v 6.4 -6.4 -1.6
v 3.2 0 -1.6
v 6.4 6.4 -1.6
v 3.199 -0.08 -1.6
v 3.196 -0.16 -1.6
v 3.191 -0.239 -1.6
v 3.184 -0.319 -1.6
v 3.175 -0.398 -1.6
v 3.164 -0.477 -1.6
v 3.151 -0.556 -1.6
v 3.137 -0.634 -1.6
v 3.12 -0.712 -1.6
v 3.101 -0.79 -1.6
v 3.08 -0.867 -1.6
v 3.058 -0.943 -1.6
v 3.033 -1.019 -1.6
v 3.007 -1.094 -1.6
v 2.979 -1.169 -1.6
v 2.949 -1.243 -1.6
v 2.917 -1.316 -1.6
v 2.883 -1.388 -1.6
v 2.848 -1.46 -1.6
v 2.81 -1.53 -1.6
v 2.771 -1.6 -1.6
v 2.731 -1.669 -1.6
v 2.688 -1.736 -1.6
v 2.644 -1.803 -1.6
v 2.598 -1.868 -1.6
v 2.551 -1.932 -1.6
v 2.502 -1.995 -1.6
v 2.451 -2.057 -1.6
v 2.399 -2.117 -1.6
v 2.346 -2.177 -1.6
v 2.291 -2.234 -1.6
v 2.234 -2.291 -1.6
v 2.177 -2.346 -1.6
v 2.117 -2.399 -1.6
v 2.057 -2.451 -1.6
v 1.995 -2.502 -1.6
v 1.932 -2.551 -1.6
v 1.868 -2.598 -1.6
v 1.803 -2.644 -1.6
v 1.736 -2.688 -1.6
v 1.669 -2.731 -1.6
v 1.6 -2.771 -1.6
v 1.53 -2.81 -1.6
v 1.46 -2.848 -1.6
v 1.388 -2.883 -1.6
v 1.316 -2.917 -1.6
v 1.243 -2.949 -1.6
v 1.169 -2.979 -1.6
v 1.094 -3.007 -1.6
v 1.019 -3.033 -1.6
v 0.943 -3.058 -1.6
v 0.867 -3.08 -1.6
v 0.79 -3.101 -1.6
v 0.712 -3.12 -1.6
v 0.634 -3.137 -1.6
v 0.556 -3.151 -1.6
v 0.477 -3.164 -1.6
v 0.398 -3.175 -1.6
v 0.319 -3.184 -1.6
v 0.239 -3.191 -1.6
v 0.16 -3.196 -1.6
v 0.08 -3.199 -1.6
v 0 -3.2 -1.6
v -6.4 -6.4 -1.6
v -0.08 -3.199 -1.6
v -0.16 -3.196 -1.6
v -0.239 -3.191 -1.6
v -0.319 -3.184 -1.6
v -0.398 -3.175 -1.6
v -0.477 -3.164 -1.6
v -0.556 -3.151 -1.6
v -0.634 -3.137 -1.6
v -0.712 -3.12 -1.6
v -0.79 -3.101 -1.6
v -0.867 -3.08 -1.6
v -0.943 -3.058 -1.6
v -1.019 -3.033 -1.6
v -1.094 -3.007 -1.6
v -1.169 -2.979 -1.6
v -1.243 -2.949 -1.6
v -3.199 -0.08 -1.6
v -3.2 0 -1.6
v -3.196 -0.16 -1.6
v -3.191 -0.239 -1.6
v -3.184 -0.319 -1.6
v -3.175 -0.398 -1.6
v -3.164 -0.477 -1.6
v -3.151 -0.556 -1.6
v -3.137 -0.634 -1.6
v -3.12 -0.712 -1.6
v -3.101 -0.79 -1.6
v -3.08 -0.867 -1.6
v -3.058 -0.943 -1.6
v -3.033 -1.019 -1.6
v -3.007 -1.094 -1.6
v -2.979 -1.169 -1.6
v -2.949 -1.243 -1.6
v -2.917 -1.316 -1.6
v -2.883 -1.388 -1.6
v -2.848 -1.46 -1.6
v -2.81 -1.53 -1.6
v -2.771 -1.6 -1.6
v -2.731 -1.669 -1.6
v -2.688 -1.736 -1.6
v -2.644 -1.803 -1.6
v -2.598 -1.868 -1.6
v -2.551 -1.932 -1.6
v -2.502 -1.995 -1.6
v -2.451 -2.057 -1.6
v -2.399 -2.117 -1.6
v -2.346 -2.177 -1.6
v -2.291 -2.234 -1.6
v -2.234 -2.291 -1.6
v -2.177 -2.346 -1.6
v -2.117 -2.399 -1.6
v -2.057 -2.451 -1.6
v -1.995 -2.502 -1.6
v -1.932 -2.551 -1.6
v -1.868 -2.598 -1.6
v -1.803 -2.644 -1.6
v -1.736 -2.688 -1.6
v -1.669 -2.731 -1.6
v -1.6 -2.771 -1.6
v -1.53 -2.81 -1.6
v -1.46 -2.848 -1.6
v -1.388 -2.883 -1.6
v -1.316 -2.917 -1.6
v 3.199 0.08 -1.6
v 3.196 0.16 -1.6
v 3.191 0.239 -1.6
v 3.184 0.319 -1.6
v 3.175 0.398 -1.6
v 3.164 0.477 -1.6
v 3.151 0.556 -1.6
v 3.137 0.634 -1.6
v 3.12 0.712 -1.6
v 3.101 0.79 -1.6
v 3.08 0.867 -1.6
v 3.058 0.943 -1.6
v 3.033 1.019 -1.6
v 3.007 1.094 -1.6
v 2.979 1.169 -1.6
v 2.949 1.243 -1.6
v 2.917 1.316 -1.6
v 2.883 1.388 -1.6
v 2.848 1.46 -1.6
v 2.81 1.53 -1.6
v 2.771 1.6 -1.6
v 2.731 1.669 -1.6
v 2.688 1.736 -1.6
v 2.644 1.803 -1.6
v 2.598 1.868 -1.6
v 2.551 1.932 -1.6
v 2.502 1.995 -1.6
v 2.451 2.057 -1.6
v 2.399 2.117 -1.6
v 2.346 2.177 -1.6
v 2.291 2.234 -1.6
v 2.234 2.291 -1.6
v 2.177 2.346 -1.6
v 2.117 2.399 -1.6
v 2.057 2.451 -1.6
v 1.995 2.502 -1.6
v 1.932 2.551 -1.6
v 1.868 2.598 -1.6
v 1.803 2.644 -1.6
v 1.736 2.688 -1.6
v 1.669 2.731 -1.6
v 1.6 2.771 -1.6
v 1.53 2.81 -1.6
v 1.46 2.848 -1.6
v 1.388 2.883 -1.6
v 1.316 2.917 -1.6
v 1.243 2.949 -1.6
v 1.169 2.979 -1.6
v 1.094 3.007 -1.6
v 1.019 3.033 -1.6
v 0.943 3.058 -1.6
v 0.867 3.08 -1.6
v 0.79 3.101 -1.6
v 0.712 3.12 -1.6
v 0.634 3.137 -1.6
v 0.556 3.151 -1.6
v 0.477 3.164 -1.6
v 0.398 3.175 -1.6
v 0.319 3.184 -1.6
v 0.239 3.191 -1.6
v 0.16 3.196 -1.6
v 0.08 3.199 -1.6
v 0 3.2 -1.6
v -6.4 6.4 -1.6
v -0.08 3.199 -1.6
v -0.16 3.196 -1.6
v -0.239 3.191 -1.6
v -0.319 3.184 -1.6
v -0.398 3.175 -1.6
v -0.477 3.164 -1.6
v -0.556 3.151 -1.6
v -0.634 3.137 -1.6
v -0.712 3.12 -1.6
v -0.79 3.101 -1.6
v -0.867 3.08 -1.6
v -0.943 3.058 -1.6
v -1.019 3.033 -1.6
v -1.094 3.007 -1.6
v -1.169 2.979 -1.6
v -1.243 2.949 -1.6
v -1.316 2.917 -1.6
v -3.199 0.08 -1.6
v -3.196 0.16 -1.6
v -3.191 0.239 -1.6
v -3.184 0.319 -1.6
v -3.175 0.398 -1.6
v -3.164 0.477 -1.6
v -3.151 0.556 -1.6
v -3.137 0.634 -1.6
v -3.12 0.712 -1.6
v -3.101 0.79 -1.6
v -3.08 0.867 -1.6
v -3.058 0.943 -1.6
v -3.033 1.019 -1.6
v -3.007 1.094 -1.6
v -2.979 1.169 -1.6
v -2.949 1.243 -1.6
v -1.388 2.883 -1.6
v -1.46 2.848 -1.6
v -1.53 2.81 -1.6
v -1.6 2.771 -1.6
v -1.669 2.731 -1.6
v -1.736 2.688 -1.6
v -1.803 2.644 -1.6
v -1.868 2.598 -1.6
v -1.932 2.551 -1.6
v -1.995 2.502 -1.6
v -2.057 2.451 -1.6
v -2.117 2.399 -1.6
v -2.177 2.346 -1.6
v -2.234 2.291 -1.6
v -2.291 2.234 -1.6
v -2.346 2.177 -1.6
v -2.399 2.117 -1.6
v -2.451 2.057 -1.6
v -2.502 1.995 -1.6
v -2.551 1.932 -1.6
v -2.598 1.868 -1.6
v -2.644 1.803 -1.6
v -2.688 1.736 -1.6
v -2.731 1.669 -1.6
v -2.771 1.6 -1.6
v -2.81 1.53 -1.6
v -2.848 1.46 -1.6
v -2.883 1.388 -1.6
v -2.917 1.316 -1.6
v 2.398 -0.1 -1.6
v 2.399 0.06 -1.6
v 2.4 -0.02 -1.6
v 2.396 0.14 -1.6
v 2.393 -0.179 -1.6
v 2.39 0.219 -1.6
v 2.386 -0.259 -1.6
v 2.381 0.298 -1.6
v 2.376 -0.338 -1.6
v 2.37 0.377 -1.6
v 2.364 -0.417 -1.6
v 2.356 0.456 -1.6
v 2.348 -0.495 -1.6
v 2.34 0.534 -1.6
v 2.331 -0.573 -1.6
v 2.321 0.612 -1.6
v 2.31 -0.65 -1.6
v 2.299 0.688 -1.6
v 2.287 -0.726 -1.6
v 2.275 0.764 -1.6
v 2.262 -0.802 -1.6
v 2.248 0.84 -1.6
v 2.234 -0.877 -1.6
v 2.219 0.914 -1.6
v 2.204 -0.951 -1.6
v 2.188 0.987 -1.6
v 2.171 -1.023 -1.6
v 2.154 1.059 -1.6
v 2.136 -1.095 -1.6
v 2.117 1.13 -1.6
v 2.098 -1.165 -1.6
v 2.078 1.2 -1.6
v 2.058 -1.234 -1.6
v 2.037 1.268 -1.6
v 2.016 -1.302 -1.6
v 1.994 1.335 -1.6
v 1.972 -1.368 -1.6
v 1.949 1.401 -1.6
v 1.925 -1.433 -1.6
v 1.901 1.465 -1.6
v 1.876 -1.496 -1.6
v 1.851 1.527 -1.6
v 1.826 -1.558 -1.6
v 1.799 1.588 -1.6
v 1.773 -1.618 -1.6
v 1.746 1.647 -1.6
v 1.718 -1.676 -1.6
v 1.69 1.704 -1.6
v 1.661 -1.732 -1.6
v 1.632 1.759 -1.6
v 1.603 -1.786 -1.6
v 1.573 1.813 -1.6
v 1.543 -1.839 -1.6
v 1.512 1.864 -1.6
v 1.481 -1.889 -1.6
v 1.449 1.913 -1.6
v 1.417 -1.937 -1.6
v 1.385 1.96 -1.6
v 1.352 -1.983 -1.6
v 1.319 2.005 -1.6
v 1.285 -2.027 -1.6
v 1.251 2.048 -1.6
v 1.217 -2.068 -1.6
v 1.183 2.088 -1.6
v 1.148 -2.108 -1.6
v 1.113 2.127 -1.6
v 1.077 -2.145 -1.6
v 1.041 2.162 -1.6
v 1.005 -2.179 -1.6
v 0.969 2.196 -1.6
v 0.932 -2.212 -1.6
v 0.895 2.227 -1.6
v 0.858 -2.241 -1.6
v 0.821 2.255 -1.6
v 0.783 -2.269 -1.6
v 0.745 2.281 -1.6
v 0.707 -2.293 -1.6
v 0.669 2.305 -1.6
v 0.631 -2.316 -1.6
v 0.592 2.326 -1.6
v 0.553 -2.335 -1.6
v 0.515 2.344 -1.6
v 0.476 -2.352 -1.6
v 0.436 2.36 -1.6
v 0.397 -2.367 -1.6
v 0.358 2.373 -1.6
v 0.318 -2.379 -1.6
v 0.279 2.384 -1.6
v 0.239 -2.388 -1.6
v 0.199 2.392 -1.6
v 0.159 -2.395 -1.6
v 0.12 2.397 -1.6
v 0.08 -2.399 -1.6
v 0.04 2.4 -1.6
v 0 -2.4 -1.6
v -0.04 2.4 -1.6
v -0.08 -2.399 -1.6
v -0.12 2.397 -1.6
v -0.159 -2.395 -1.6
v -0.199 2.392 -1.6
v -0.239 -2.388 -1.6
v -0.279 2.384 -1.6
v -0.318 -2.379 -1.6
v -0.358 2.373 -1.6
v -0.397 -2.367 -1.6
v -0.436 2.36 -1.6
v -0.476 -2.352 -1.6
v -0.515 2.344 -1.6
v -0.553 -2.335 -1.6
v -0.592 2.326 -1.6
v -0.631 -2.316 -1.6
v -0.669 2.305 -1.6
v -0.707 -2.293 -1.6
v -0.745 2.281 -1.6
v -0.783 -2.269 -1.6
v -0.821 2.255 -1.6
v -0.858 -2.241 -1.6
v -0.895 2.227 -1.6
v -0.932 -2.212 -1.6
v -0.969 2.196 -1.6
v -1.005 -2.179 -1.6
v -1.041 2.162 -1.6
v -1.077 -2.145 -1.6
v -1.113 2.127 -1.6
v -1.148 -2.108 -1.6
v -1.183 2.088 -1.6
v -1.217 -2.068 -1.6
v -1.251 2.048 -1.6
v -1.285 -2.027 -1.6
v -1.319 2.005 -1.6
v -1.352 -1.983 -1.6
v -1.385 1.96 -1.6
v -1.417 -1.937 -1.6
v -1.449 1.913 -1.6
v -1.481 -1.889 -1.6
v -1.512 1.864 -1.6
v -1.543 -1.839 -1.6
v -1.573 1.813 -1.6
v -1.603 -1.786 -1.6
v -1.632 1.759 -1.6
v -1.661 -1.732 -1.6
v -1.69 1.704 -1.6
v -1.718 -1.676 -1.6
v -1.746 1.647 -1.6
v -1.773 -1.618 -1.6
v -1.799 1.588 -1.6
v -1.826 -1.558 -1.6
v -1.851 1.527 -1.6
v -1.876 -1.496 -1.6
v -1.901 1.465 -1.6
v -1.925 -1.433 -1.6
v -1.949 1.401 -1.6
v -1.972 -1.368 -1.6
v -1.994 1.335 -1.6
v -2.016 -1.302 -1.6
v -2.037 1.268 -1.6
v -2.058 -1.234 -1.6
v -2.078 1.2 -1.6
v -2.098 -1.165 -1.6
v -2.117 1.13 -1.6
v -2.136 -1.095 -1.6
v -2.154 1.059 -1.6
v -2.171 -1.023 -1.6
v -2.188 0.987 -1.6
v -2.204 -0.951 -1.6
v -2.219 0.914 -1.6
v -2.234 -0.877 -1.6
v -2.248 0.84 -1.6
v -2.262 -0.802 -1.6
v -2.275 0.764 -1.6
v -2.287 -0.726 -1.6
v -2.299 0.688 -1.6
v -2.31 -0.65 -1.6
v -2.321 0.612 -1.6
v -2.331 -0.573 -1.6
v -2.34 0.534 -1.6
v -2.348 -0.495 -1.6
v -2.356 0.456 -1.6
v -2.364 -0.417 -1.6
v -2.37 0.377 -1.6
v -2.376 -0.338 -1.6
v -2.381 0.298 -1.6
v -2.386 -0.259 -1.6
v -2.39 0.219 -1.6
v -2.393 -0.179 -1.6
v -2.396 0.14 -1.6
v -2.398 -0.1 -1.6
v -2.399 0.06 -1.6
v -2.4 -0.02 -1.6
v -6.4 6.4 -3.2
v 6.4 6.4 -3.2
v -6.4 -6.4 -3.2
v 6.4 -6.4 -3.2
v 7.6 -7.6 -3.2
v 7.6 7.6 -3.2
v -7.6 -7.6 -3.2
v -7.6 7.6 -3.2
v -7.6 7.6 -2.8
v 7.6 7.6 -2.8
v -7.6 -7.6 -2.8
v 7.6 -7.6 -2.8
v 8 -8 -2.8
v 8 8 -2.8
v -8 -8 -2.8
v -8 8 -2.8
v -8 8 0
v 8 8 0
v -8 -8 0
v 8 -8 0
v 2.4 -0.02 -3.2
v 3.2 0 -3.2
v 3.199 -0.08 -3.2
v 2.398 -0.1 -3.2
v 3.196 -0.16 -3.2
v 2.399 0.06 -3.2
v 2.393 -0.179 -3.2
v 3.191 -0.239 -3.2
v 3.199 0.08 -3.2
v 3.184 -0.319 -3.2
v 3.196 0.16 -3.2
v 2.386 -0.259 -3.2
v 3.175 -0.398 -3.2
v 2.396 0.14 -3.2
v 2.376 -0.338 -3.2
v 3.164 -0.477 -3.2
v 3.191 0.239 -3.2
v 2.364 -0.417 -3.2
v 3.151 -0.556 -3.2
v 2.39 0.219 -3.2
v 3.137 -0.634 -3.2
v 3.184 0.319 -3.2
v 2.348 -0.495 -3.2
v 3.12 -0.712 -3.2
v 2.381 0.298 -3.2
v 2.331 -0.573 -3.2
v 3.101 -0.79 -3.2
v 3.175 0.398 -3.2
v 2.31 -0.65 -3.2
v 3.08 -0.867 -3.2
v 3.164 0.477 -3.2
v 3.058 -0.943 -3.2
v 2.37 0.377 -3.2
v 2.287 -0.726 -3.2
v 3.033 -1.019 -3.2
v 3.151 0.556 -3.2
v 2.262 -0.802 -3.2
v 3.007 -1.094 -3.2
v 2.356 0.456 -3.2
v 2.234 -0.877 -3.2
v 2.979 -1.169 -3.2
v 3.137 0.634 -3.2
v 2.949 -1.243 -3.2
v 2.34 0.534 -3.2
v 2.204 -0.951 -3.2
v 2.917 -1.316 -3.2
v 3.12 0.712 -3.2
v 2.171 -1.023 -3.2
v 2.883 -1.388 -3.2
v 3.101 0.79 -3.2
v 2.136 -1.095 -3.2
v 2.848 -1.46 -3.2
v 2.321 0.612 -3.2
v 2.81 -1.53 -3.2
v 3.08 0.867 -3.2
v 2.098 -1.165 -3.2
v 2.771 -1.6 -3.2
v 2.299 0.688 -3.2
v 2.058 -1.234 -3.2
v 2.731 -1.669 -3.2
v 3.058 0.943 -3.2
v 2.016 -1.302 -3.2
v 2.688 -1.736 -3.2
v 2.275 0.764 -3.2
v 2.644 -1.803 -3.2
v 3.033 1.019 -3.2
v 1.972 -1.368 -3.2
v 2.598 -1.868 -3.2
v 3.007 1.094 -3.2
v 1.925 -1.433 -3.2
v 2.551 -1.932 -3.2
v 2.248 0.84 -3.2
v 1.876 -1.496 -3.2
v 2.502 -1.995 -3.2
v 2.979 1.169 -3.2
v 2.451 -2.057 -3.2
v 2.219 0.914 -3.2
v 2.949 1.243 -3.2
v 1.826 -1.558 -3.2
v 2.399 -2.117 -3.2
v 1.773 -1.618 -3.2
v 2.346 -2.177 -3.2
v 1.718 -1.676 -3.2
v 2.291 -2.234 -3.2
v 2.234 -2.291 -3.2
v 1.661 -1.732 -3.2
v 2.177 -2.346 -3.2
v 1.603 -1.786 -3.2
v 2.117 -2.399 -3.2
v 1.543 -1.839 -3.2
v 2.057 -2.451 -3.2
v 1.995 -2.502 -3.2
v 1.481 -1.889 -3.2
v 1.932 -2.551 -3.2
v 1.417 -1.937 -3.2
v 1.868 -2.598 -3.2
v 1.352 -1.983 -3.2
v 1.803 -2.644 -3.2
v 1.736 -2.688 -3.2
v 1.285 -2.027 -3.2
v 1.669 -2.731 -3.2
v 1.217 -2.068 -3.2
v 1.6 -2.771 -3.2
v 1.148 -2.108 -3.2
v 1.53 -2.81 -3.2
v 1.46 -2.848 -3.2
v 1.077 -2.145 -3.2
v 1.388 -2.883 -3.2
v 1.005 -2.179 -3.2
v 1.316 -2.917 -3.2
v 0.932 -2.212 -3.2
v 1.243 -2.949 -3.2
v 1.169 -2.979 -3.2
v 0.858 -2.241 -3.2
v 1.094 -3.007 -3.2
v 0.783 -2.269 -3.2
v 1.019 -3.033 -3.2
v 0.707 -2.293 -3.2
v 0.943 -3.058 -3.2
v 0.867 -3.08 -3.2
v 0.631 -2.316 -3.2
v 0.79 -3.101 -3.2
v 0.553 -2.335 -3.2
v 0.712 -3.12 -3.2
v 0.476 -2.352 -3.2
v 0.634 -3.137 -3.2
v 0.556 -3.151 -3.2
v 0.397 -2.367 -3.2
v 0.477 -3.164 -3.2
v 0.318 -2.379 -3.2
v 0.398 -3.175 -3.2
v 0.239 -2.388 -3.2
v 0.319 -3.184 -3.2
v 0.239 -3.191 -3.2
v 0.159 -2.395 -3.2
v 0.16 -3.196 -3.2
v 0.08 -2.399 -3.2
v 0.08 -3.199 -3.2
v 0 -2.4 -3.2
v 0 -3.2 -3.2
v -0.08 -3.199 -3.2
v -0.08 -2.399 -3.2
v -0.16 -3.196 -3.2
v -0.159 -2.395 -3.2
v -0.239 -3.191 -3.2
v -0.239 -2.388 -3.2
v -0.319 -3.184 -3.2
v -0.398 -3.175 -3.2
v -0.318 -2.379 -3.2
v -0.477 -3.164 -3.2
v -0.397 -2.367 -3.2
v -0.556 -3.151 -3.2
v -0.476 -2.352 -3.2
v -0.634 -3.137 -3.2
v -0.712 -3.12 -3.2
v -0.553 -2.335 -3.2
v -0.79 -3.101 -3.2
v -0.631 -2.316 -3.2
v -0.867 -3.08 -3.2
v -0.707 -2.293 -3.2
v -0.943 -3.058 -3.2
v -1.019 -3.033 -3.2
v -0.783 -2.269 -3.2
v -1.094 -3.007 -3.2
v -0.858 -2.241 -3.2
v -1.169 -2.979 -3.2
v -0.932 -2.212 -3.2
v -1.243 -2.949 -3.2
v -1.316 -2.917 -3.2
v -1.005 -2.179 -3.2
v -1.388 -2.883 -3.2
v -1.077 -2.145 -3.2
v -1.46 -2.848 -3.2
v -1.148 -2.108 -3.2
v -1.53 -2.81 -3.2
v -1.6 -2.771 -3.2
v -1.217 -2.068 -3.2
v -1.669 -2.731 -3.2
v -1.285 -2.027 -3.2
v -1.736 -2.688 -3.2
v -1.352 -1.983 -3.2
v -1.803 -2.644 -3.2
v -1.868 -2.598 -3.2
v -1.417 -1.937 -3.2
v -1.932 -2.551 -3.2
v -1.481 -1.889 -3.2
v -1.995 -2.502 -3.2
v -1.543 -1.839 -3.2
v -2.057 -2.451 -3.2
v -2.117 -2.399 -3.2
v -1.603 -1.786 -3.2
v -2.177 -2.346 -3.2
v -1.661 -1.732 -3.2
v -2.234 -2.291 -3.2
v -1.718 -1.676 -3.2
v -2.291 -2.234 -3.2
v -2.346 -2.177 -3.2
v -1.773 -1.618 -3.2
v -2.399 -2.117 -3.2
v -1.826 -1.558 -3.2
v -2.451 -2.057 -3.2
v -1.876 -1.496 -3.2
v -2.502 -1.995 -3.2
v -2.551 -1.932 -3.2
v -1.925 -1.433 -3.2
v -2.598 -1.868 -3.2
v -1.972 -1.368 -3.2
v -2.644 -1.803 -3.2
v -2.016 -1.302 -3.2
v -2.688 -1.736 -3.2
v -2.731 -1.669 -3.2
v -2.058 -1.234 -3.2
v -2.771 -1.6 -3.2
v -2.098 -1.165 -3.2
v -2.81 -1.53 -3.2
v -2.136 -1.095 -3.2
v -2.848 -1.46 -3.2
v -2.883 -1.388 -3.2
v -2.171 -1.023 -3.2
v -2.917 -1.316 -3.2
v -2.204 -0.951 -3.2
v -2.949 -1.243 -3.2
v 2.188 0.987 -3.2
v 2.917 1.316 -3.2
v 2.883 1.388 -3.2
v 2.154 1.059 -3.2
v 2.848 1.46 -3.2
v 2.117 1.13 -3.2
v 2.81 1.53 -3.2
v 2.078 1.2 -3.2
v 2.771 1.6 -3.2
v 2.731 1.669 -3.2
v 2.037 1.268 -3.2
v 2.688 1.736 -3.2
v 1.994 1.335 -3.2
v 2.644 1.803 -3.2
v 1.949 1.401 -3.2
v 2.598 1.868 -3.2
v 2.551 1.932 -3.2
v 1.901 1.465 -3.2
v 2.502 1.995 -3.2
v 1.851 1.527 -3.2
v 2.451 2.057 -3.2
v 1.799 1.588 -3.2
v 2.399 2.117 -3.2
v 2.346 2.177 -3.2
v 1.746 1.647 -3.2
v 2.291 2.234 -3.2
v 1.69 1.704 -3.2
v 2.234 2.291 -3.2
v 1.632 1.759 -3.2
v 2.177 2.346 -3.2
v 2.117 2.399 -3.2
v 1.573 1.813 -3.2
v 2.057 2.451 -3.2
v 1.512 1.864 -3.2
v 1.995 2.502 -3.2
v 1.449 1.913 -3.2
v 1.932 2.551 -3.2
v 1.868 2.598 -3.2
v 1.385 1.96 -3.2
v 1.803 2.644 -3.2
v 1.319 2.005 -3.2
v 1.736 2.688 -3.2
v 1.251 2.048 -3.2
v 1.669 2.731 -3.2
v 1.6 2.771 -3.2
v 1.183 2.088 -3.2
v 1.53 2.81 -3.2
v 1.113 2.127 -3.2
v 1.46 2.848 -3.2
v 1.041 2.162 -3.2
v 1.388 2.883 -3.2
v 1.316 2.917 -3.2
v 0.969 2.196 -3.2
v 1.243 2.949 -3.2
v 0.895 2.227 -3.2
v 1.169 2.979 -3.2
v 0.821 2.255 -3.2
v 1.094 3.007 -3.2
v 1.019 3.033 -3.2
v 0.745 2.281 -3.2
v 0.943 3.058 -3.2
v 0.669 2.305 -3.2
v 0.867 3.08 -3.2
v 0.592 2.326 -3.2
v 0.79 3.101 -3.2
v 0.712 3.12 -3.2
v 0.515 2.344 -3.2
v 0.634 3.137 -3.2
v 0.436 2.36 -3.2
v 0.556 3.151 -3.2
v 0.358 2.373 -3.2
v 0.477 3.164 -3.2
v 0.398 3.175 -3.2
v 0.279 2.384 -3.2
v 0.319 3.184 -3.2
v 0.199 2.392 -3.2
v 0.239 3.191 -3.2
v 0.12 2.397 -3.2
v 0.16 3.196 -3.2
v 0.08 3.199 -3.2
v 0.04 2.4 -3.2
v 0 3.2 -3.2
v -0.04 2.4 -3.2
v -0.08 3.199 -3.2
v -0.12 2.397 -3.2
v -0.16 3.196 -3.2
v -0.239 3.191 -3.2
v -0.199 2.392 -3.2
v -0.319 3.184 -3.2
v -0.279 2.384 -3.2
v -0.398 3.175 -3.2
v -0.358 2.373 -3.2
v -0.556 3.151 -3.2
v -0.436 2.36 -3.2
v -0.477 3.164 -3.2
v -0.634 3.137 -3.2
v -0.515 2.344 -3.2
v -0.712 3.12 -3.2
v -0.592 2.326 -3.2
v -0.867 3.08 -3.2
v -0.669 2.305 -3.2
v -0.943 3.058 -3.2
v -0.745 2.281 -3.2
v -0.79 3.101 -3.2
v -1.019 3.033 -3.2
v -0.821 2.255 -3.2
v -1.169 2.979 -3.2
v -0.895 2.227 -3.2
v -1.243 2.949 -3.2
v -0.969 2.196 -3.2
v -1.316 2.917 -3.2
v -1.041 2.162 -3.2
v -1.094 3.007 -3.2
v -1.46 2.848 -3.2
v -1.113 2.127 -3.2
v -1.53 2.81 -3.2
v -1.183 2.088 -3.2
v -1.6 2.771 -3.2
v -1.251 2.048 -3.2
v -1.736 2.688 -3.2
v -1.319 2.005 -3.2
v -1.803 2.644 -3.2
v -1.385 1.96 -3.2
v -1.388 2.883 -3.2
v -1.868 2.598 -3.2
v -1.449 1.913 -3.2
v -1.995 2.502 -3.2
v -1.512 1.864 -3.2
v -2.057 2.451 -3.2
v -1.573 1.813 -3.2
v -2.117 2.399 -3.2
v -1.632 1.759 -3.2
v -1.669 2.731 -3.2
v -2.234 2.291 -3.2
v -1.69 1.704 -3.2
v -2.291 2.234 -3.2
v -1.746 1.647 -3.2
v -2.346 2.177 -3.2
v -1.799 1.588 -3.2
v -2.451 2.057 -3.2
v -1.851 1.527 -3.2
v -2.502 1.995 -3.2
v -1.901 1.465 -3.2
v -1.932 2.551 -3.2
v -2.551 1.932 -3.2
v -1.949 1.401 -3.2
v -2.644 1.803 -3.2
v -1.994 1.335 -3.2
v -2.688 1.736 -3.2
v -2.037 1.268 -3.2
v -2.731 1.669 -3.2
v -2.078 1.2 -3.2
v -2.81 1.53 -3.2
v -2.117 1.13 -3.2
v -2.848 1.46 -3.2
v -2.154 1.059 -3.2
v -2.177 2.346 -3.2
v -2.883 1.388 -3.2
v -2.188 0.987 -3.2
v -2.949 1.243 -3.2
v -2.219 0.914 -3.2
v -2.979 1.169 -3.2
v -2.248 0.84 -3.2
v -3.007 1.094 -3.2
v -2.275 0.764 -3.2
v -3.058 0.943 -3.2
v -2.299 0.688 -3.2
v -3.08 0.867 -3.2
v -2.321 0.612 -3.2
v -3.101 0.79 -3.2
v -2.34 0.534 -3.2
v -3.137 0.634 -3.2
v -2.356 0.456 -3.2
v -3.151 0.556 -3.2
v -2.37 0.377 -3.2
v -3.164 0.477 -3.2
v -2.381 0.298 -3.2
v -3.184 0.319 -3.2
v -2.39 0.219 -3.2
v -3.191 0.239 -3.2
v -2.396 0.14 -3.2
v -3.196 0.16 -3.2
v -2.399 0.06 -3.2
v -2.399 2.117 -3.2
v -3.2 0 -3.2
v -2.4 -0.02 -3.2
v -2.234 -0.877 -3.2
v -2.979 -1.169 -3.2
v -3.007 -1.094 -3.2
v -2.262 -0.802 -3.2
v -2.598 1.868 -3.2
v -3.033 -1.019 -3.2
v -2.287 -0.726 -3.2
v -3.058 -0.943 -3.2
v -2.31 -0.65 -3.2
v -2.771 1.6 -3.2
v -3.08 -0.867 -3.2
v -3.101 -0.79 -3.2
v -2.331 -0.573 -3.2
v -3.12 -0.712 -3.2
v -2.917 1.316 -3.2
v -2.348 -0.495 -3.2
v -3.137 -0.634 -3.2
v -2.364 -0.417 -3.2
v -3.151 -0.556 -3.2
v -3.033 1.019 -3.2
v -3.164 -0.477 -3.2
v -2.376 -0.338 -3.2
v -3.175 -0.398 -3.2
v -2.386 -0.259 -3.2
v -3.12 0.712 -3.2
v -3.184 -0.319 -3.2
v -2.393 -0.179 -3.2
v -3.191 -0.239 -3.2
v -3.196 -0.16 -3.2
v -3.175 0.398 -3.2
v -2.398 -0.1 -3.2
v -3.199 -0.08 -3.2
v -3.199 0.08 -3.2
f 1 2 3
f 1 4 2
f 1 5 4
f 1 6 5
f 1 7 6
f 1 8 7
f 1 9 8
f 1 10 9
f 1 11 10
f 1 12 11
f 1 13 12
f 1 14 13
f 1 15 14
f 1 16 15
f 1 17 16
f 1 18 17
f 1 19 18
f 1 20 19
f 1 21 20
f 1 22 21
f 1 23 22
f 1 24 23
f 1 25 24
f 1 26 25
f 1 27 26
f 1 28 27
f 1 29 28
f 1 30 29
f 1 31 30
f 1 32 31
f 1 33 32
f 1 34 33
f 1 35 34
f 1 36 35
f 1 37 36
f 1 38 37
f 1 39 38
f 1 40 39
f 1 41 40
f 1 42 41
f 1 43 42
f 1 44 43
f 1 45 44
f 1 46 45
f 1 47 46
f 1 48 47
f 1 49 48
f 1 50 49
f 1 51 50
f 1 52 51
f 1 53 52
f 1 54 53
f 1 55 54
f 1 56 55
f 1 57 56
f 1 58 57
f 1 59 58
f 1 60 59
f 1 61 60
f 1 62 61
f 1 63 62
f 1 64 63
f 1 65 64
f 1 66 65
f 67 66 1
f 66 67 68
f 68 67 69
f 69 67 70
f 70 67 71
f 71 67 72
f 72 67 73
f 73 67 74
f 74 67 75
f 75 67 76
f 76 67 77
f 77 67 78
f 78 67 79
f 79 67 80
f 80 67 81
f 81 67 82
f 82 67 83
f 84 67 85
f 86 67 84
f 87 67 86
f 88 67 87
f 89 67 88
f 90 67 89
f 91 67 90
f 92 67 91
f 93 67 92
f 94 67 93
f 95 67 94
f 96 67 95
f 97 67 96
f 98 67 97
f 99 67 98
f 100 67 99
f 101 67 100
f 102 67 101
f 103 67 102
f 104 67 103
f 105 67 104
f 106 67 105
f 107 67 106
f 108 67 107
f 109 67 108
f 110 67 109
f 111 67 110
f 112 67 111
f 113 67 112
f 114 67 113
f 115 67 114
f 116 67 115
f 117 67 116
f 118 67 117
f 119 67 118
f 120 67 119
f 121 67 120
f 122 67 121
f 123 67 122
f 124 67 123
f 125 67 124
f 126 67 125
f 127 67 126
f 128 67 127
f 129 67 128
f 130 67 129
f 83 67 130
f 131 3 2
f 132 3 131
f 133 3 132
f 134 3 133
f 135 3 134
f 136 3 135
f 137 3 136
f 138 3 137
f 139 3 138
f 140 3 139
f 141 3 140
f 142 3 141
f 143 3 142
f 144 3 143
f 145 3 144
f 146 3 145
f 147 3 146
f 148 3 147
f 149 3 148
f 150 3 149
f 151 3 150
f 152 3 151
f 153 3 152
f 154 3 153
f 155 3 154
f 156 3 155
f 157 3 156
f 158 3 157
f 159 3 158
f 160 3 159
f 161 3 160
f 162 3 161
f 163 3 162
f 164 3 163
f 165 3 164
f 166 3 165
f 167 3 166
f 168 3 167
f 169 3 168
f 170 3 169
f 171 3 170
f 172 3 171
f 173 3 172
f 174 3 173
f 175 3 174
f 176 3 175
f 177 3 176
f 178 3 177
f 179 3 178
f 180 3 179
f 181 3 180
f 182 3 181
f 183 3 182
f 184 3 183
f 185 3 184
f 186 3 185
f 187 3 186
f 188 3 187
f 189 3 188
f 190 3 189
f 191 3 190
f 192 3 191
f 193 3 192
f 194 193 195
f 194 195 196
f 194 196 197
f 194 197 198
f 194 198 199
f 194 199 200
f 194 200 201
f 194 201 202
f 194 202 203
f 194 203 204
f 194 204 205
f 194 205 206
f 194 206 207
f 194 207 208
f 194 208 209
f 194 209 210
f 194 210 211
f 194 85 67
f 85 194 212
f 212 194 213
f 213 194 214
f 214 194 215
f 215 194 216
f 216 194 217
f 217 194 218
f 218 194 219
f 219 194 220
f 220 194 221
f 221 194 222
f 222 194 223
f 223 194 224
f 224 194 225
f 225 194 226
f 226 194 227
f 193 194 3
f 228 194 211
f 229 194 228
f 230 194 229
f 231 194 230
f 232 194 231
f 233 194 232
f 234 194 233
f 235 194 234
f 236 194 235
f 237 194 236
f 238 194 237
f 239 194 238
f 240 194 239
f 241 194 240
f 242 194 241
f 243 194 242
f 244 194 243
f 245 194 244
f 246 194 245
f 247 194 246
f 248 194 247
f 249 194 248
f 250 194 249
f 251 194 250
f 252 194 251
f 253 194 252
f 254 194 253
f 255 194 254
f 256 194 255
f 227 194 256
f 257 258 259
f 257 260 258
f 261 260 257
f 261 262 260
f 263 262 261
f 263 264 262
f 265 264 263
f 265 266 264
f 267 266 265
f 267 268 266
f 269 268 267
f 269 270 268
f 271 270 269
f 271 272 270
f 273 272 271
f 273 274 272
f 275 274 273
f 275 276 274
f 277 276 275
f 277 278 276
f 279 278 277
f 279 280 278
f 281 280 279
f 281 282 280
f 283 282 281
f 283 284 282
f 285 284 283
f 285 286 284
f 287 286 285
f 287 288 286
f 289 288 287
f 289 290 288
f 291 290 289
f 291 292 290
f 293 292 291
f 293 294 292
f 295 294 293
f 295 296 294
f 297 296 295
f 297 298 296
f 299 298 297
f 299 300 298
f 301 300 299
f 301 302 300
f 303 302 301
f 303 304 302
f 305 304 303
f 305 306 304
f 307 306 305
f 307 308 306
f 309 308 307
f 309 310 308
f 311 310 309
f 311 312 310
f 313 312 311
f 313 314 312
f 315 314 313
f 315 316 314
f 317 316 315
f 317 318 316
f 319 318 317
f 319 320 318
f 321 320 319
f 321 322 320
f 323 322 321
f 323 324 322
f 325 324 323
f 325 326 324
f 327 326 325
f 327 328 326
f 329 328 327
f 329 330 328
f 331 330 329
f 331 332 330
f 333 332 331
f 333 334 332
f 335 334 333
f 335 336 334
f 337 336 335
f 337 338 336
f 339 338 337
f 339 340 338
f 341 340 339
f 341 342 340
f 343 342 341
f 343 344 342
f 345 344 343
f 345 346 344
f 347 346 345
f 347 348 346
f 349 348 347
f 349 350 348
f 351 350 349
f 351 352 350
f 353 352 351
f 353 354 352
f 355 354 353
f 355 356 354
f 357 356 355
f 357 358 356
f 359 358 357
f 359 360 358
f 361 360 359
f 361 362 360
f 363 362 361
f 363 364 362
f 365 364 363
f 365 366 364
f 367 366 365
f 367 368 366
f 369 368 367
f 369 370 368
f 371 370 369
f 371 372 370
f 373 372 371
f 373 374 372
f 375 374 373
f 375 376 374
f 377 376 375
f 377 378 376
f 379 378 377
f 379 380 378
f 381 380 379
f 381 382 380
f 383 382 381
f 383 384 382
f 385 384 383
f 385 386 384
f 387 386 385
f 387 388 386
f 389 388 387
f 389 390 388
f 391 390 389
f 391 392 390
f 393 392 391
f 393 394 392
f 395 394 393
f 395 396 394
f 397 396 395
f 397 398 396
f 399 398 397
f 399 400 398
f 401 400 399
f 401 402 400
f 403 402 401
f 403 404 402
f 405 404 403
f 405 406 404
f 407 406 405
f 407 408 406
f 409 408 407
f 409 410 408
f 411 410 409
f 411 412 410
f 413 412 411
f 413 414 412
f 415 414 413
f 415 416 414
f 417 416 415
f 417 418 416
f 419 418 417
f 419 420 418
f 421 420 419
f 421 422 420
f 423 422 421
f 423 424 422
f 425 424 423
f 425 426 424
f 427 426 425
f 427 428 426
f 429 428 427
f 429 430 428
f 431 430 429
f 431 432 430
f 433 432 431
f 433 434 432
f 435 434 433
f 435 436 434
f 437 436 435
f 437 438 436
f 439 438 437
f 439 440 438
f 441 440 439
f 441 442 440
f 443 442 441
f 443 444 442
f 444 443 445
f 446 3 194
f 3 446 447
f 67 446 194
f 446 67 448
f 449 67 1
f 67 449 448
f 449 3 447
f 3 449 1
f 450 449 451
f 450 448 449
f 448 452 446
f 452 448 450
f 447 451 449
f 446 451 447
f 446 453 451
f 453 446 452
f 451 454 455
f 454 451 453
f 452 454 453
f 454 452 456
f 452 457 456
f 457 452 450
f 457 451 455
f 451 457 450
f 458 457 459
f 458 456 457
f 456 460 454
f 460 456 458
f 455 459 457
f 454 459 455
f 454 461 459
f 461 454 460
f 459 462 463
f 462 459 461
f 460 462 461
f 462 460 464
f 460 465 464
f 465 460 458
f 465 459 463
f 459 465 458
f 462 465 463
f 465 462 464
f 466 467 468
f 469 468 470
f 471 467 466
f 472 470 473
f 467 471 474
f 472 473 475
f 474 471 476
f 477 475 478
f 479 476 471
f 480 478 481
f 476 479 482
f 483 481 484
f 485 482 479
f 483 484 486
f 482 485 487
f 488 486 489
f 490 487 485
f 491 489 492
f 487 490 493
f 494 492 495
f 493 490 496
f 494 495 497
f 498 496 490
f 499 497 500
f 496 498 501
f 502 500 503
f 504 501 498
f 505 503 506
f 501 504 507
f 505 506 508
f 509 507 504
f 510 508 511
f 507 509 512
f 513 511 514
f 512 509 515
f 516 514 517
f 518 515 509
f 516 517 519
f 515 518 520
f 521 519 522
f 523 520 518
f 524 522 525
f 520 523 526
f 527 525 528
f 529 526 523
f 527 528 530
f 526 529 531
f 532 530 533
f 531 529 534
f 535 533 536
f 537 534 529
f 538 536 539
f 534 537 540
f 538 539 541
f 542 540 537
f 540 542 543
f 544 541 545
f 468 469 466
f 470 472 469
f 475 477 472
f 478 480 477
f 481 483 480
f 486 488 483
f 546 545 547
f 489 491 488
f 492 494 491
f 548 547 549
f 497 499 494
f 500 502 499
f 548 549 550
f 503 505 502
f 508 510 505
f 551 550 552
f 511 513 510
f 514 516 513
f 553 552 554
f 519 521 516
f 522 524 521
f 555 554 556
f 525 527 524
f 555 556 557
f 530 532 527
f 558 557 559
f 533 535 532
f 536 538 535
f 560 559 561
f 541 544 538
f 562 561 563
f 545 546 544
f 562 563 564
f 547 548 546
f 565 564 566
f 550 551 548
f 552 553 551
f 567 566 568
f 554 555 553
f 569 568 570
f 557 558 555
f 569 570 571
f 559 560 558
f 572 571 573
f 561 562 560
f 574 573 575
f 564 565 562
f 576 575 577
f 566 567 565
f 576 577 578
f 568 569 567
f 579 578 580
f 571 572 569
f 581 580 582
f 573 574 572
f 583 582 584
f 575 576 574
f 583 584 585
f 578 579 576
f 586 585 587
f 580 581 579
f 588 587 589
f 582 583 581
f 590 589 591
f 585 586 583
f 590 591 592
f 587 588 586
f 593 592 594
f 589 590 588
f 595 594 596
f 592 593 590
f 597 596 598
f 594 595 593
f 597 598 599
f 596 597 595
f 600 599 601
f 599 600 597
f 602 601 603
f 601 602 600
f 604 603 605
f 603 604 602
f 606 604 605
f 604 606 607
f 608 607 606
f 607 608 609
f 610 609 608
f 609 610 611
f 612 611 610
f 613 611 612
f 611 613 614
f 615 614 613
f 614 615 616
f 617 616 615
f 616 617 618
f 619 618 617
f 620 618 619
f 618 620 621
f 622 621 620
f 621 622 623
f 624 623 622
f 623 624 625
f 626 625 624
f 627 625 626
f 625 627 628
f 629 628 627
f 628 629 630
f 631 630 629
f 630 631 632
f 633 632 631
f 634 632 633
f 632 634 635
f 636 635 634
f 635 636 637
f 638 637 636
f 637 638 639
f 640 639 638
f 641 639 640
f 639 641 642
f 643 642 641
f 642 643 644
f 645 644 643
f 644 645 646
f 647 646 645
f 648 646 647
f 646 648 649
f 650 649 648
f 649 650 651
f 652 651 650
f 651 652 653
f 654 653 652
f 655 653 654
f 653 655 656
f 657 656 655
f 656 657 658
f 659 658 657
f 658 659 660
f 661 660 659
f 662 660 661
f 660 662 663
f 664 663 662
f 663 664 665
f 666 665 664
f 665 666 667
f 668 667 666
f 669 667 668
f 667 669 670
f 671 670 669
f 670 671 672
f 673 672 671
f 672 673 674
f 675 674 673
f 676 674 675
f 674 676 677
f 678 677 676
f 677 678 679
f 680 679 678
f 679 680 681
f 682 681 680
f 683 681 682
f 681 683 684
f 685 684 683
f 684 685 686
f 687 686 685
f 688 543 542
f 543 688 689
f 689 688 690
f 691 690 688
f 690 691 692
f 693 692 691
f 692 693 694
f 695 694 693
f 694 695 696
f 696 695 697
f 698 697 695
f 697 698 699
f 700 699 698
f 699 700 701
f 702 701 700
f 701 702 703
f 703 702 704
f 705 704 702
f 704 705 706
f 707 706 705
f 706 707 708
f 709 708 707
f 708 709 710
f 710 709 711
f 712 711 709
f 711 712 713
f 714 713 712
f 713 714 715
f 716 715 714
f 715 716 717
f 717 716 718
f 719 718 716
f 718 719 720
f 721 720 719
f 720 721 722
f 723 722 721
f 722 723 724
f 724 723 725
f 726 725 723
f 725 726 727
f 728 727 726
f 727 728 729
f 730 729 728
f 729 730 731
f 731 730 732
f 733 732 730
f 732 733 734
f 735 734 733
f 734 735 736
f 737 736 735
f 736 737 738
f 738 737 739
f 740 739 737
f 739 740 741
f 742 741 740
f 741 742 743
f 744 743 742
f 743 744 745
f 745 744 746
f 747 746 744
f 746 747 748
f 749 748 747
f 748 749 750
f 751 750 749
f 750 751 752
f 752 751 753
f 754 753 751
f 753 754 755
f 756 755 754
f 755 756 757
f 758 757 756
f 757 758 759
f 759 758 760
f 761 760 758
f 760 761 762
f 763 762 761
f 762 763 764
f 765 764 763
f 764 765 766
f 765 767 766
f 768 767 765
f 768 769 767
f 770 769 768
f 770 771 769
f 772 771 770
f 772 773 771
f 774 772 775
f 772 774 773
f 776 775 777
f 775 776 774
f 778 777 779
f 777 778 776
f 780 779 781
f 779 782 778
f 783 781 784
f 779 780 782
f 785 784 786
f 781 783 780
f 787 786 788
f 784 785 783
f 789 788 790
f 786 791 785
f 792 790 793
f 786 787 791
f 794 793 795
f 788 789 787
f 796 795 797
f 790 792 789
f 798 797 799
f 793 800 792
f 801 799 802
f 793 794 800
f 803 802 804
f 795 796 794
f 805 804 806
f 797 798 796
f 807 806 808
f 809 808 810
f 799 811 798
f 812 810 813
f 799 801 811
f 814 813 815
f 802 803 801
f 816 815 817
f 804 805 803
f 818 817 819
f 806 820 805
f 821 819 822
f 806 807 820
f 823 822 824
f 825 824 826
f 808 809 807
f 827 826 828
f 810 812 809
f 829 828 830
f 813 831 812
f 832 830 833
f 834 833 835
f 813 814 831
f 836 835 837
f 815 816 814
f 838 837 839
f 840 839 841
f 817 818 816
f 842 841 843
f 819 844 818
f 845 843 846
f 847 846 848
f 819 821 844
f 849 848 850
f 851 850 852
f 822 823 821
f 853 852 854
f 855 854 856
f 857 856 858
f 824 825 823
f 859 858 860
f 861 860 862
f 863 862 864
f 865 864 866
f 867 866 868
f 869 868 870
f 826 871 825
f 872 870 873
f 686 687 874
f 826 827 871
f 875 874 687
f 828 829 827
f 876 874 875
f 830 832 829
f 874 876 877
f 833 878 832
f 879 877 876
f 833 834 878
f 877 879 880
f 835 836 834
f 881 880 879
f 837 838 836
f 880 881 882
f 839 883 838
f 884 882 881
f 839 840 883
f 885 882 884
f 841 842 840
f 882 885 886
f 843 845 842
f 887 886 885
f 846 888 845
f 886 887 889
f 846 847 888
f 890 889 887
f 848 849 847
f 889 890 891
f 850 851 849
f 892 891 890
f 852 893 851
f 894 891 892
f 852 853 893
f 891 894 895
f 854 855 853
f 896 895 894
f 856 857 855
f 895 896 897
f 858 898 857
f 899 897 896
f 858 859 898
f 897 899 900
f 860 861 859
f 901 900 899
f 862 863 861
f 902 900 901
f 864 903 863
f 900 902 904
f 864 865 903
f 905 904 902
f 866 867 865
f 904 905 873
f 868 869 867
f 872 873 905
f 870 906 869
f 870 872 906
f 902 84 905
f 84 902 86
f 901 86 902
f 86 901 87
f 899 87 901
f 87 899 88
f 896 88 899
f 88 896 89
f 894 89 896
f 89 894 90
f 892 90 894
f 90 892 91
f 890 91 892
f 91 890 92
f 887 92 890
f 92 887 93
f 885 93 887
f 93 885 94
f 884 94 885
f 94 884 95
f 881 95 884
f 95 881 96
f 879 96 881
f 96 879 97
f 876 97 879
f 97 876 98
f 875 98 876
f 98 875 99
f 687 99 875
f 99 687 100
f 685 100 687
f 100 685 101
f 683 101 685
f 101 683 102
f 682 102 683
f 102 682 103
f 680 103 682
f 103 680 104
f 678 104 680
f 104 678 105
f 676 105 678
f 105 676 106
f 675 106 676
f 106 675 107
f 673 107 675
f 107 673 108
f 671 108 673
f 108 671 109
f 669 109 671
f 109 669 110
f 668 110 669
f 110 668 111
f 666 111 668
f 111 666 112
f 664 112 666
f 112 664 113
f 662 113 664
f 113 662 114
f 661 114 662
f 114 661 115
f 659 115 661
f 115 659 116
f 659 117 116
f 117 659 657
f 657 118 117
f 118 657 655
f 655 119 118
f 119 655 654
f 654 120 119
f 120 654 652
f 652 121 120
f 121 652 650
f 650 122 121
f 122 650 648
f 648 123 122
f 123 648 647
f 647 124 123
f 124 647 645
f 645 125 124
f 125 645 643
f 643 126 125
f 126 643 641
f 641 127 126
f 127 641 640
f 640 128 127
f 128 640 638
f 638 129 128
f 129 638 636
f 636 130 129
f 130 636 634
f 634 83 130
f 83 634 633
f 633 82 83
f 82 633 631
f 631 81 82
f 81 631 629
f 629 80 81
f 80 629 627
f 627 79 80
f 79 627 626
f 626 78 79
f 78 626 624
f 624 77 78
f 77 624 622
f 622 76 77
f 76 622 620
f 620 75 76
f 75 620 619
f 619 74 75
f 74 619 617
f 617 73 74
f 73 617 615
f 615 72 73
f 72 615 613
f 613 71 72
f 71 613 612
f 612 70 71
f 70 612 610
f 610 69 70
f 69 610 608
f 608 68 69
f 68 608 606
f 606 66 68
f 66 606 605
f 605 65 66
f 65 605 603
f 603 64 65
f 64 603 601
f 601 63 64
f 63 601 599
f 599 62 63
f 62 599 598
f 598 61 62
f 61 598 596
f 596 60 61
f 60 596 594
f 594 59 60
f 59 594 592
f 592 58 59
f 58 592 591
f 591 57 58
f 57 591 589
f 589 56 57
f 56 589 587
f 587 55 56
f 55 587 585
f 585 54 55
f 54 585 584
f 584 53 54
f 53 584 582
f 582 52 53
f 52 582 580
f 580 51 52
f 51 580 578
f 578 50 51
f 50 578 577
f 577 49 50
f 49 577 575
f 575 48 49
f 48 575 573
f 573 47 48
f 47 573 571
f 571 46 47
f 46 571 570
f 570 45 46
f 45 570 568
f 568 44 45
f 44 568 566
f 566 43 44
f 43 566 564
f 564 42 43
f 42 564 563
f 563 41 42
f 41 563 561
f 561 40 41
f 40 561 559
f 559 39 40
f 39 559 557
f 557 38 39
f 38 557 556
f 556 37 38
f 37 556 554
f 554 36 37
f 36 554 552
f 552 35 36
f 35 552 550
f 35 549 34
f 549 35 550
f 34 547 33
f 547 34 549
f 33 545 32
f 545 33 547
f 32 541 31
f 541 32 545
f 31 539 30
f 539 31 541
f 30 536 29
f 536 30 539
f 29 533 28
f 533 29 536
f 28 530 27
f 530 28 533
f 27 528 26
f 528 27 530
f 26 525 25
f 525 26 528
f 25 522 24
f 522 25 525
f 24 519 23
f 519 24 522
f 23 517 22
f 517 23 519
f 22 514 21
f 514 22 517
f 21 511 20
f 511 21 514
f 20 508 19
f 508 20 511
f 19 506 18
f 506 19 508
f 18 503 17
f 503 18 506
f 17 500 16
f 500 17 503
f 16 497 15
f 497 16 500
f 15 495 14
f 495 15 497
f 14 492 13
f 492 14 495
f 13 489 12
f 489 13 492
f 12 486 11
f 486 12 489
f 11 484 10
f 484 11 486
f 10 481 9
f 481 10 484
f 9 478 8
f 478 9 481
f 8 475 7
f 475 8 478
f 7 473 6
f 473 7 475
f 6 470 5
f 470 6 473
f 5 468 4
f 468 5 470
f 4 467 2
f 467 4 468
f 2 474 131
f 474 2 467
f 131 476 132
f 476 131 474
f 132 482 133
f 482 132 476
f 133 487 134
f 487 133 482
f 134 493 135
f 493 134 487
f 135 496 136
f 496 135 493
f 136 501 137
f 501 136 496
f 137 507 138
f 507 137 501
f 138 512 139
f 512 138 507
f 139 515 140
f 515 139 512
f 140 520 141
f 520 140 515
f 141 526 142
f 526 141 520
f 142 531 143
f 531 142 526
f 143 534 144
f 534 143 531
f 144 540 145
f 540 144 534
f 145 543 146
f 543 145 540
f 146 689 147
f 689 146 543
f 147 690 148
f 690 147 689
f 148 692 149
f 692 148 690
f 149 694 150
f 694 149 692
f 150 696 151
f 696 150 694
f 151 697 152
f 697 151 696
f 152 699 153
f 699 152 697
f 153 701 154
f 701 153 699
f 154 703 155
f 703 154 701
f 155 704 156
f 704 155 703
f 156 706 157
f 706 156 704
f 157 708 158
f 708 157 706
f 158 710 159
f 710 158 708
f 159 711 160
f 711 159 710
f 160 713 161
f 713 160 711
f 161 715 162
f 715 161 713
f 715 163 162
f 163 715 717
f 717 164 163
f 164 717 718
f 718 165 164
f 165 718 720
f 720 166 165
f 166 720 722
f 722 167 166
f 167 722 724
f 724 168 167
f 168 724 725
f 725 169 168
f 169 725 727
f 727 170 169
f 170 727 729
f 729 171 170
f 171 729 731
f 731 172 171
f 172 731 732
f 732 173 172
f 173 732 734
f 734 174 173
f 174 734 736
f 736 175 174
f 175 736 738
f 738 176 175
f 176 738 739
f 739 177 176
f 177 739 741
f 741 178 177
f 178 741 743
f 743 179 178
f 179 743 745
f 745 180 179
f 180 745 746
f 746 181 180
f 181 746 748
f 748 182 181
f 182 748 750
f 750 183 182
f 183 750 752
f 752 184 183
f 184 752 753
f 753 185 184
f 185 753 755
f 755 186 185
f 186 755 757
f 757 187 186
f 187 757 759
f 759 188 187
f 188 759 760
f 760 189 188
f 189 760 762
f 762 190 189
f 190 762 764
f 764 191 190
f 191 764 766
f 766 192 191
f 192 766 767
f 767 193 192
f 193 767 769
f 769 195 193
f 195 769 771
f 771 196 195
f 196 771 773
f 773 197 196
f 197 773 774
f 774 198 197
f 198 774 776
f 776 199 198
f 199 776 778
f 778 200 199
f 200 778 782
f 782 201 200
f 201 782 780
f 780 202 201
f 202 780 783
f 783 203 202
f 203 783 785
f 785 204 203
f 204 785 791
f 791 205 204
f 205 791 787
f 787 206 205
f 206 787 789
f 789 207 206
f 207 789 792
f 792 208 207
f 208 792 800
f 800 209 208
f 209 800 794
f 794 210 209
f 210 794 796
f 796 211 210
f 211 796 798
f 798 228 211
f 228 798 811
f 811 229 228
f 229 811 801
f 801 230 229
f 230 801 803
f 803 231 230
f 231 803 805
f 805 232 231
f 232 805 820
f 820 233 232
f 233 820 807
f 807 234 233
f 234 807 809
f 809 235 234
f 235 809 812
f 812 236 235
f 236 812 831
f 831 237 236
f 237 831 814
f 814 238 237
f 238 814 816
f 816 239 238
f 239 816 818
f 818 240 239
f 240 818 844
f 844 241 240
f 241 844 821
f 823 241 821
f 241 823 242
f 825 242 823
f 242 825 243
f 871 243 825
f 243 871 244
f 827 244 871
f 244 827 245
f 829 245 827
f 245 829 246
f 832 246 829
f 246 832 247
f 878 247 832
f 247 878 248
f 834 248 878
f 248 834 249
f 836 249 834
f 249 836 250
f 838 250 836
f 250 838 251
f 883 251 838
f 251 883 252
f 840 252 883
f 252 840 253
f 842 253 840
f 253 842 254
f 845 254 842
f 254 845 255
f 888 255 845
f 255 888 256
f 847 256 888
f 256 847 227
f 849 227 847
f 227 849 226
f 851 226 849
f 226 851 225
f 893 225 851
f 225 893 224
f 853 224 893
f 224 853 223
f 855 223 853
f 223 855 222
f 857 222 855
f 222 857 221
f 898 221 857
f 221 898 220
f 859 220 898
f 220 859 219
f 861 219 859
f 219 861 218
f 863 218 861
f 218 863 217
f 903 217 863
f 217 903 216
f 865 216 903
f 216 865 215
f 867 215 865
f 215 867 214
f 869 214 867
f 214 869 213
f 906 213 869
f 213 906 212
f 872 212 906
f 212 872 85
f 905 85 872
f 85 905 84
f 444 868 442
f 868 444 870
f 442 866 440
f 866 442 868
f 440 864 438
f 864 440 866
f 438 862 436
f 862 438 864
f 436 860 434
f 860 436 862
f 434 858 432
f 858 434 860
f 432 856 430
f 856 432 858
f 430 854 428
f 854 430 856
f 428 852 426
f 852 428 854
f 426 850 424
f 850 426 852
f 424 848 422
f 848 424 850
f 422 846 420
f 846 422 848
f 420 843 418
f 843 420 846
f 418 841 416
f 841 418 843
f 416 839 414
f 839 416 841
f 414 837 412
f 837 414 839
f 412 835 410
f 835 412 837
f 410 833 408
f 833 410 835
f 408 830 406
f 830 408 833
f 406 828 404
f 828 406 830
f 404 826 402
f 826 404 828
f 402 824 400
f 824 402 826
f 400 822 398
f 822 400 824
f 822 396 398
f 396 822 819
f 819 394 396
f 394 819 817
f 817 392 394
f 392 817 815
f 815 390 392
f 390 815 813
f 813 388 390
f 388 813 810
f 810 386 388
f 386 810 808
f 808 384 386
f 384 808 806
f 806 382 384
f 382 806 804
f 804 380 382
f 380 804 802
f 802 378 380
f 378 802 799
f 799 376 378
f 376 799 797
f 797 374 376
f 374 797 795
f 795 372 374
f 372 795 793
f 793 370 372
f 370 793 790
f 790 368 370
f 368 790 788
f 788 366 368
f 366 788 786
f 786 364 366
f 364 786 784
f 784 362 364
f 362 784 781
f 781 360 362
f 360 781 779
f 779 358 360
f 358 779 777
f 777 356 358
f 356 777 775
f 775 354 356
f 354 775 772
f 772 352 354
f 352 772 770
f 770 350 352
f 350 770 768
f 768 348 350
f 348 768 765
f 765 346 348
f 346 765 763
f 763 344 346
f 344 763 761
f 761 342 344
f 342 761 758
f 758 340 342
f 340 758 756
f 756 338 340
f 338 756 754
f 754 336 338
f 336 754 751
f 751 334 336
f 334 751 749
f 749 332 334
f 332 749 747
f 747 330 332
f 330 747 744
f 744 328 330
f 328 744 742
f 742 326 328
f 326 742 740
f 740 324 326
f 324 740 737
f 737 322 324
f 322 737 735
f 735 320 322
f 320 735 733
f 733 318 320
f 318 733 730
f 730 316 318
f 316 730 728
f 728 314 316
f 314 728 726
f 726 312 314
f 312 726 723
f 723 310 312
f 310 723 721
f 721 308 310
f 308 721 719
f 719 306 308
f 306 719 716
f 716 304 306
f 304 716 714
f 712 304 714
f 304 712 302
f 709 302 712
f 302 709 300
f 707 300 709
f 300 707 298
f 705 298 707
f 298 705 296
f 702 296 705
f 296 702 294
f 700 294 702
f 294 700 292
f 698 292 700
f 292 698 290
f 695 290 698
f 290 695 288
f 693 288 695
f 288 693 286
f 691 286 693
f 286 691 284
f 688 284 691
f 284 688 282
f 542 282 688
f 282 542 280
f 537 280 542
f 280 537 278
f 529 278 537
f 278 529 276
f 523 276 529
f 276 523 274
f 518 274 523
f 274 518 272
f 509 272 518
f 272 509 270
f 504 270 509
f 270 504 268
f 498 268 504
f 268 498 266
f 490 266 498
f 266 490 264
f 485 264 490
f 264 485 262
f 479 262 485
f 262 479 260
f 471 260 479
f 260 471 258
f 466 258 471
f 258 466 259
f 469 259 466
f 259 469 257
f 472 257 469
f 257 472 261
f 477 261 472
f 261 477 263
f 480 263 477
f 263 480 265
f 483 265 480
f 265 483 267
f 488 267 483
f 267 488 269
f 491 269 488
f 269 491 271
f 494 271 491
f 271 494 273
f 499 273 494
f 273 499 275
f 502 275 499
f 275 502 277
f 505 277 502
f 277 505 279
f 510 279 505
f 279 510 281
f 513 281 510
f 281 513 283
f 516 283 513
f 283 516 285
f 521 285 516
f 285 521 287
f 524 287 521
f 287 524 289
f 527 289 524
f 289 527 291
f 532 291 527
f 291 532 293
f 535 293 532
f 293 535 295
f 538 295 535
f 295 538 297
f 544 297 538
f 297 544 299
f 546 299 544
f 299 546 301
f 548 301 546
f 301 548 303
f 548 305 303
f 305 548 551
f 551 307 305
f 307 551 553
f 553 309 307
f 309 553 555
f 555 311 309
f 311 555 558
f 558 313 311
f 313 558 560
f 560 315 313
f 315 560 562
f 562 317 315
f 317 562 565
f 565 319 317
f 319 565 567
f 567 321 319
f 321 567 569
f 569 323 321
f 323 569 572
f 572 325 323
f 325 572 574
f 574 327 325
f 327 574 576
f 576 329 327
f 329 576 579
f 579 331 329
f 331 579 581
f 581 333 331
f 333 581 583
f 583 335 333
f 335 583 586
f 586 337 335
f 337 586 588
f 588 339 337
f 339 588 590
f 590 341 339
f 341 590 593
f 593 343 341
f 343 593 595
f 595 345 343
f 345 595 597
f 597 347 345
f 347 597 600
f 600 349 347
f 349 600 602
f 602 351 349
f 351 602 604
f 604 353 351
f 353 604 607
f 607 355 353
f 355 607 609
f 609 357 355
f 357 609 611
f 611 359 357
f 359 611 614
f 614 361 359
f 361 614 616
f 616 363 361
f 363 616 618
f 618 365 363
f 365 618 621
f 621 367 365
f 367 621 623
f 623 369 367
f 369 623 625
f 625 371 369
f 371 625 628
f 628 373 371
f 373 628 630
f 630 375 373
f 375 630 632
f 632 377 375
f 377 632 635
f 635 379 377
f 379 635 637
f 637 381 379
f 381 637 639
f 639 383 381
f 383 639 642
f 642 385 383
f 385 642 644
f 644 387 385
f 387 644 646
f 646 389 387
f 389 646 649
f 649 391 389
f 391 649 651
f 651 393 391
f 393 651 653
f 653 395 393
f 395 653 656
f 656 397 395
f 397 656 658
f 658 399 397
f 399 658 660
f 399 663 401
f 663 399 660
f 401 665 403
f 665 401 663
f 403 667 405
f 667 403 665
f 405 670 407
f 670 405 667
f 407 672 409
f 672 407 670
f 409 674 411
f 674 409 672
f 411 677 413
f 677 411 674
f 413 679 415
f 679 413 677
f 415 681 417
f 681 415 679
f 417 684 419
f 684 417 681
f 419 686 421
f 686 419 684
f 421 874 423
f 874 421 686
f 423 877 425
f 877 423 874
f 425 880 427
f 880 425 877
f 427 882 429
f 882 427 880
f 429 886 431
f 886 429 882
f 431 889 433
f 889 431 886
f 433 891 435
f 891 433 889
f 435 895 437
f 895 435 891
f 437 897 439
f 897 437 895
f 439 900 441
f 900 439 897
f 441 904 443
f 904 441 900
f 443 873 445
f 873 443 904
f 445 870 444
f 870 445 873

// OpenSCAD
use <../lib.scad>
use <3068bp52.scad>
$fa=1; $fs=0.2;
function ldraw_lib__3068p52(realsolid=false) = [
// 0 ~Moved to 3068bp52
// 0 Name: 3068p52.dat
// 0 Author: [PTadmin]
// 0 !LDRAW_ORG Part UPDATE 2002-04
// 0 !LICENSE Licensed under CC BY 4.0 : see CAreadme.txt
// 
// 0 BFC CERTIFY CCW
  [0,"BFC","CERTIFY"],
  [0,"BFC","CCW"],
// 
// 0 !HISTORY 1998-03-23 [PTadmin] Official Update 1998-03
// 0 !HISTORY 2002-08-18 [PTadmin] Official Update 2002-04
// 0 !HISTORY 2007-06-13 [PTadmin] Header formatted for Contributor Agreement
// 0 !HISTORY 2008-07-01 [PTadmin] Official Update 2008-01
// 
// 
// 1 16 0 0 0 1 0 0 0 1 0 0 0 1 3068bp52.dat
  [1,16,0,0,0,1,0,0,0,1,0,0,0,1, ldraw_lib__3068bp52(realsolid)],
];
module ldraw_lib__3068p52(step=0, col=false, unit=2/5, alt=false, line=0.2, solid=!$preview)
    makepoly(ldraw_lib__3068p52(solid), step=step, col=col, unit=unit, alt=alt, line=line, solid=solid);
ldraw_lib__3068p52(line=0.2);
